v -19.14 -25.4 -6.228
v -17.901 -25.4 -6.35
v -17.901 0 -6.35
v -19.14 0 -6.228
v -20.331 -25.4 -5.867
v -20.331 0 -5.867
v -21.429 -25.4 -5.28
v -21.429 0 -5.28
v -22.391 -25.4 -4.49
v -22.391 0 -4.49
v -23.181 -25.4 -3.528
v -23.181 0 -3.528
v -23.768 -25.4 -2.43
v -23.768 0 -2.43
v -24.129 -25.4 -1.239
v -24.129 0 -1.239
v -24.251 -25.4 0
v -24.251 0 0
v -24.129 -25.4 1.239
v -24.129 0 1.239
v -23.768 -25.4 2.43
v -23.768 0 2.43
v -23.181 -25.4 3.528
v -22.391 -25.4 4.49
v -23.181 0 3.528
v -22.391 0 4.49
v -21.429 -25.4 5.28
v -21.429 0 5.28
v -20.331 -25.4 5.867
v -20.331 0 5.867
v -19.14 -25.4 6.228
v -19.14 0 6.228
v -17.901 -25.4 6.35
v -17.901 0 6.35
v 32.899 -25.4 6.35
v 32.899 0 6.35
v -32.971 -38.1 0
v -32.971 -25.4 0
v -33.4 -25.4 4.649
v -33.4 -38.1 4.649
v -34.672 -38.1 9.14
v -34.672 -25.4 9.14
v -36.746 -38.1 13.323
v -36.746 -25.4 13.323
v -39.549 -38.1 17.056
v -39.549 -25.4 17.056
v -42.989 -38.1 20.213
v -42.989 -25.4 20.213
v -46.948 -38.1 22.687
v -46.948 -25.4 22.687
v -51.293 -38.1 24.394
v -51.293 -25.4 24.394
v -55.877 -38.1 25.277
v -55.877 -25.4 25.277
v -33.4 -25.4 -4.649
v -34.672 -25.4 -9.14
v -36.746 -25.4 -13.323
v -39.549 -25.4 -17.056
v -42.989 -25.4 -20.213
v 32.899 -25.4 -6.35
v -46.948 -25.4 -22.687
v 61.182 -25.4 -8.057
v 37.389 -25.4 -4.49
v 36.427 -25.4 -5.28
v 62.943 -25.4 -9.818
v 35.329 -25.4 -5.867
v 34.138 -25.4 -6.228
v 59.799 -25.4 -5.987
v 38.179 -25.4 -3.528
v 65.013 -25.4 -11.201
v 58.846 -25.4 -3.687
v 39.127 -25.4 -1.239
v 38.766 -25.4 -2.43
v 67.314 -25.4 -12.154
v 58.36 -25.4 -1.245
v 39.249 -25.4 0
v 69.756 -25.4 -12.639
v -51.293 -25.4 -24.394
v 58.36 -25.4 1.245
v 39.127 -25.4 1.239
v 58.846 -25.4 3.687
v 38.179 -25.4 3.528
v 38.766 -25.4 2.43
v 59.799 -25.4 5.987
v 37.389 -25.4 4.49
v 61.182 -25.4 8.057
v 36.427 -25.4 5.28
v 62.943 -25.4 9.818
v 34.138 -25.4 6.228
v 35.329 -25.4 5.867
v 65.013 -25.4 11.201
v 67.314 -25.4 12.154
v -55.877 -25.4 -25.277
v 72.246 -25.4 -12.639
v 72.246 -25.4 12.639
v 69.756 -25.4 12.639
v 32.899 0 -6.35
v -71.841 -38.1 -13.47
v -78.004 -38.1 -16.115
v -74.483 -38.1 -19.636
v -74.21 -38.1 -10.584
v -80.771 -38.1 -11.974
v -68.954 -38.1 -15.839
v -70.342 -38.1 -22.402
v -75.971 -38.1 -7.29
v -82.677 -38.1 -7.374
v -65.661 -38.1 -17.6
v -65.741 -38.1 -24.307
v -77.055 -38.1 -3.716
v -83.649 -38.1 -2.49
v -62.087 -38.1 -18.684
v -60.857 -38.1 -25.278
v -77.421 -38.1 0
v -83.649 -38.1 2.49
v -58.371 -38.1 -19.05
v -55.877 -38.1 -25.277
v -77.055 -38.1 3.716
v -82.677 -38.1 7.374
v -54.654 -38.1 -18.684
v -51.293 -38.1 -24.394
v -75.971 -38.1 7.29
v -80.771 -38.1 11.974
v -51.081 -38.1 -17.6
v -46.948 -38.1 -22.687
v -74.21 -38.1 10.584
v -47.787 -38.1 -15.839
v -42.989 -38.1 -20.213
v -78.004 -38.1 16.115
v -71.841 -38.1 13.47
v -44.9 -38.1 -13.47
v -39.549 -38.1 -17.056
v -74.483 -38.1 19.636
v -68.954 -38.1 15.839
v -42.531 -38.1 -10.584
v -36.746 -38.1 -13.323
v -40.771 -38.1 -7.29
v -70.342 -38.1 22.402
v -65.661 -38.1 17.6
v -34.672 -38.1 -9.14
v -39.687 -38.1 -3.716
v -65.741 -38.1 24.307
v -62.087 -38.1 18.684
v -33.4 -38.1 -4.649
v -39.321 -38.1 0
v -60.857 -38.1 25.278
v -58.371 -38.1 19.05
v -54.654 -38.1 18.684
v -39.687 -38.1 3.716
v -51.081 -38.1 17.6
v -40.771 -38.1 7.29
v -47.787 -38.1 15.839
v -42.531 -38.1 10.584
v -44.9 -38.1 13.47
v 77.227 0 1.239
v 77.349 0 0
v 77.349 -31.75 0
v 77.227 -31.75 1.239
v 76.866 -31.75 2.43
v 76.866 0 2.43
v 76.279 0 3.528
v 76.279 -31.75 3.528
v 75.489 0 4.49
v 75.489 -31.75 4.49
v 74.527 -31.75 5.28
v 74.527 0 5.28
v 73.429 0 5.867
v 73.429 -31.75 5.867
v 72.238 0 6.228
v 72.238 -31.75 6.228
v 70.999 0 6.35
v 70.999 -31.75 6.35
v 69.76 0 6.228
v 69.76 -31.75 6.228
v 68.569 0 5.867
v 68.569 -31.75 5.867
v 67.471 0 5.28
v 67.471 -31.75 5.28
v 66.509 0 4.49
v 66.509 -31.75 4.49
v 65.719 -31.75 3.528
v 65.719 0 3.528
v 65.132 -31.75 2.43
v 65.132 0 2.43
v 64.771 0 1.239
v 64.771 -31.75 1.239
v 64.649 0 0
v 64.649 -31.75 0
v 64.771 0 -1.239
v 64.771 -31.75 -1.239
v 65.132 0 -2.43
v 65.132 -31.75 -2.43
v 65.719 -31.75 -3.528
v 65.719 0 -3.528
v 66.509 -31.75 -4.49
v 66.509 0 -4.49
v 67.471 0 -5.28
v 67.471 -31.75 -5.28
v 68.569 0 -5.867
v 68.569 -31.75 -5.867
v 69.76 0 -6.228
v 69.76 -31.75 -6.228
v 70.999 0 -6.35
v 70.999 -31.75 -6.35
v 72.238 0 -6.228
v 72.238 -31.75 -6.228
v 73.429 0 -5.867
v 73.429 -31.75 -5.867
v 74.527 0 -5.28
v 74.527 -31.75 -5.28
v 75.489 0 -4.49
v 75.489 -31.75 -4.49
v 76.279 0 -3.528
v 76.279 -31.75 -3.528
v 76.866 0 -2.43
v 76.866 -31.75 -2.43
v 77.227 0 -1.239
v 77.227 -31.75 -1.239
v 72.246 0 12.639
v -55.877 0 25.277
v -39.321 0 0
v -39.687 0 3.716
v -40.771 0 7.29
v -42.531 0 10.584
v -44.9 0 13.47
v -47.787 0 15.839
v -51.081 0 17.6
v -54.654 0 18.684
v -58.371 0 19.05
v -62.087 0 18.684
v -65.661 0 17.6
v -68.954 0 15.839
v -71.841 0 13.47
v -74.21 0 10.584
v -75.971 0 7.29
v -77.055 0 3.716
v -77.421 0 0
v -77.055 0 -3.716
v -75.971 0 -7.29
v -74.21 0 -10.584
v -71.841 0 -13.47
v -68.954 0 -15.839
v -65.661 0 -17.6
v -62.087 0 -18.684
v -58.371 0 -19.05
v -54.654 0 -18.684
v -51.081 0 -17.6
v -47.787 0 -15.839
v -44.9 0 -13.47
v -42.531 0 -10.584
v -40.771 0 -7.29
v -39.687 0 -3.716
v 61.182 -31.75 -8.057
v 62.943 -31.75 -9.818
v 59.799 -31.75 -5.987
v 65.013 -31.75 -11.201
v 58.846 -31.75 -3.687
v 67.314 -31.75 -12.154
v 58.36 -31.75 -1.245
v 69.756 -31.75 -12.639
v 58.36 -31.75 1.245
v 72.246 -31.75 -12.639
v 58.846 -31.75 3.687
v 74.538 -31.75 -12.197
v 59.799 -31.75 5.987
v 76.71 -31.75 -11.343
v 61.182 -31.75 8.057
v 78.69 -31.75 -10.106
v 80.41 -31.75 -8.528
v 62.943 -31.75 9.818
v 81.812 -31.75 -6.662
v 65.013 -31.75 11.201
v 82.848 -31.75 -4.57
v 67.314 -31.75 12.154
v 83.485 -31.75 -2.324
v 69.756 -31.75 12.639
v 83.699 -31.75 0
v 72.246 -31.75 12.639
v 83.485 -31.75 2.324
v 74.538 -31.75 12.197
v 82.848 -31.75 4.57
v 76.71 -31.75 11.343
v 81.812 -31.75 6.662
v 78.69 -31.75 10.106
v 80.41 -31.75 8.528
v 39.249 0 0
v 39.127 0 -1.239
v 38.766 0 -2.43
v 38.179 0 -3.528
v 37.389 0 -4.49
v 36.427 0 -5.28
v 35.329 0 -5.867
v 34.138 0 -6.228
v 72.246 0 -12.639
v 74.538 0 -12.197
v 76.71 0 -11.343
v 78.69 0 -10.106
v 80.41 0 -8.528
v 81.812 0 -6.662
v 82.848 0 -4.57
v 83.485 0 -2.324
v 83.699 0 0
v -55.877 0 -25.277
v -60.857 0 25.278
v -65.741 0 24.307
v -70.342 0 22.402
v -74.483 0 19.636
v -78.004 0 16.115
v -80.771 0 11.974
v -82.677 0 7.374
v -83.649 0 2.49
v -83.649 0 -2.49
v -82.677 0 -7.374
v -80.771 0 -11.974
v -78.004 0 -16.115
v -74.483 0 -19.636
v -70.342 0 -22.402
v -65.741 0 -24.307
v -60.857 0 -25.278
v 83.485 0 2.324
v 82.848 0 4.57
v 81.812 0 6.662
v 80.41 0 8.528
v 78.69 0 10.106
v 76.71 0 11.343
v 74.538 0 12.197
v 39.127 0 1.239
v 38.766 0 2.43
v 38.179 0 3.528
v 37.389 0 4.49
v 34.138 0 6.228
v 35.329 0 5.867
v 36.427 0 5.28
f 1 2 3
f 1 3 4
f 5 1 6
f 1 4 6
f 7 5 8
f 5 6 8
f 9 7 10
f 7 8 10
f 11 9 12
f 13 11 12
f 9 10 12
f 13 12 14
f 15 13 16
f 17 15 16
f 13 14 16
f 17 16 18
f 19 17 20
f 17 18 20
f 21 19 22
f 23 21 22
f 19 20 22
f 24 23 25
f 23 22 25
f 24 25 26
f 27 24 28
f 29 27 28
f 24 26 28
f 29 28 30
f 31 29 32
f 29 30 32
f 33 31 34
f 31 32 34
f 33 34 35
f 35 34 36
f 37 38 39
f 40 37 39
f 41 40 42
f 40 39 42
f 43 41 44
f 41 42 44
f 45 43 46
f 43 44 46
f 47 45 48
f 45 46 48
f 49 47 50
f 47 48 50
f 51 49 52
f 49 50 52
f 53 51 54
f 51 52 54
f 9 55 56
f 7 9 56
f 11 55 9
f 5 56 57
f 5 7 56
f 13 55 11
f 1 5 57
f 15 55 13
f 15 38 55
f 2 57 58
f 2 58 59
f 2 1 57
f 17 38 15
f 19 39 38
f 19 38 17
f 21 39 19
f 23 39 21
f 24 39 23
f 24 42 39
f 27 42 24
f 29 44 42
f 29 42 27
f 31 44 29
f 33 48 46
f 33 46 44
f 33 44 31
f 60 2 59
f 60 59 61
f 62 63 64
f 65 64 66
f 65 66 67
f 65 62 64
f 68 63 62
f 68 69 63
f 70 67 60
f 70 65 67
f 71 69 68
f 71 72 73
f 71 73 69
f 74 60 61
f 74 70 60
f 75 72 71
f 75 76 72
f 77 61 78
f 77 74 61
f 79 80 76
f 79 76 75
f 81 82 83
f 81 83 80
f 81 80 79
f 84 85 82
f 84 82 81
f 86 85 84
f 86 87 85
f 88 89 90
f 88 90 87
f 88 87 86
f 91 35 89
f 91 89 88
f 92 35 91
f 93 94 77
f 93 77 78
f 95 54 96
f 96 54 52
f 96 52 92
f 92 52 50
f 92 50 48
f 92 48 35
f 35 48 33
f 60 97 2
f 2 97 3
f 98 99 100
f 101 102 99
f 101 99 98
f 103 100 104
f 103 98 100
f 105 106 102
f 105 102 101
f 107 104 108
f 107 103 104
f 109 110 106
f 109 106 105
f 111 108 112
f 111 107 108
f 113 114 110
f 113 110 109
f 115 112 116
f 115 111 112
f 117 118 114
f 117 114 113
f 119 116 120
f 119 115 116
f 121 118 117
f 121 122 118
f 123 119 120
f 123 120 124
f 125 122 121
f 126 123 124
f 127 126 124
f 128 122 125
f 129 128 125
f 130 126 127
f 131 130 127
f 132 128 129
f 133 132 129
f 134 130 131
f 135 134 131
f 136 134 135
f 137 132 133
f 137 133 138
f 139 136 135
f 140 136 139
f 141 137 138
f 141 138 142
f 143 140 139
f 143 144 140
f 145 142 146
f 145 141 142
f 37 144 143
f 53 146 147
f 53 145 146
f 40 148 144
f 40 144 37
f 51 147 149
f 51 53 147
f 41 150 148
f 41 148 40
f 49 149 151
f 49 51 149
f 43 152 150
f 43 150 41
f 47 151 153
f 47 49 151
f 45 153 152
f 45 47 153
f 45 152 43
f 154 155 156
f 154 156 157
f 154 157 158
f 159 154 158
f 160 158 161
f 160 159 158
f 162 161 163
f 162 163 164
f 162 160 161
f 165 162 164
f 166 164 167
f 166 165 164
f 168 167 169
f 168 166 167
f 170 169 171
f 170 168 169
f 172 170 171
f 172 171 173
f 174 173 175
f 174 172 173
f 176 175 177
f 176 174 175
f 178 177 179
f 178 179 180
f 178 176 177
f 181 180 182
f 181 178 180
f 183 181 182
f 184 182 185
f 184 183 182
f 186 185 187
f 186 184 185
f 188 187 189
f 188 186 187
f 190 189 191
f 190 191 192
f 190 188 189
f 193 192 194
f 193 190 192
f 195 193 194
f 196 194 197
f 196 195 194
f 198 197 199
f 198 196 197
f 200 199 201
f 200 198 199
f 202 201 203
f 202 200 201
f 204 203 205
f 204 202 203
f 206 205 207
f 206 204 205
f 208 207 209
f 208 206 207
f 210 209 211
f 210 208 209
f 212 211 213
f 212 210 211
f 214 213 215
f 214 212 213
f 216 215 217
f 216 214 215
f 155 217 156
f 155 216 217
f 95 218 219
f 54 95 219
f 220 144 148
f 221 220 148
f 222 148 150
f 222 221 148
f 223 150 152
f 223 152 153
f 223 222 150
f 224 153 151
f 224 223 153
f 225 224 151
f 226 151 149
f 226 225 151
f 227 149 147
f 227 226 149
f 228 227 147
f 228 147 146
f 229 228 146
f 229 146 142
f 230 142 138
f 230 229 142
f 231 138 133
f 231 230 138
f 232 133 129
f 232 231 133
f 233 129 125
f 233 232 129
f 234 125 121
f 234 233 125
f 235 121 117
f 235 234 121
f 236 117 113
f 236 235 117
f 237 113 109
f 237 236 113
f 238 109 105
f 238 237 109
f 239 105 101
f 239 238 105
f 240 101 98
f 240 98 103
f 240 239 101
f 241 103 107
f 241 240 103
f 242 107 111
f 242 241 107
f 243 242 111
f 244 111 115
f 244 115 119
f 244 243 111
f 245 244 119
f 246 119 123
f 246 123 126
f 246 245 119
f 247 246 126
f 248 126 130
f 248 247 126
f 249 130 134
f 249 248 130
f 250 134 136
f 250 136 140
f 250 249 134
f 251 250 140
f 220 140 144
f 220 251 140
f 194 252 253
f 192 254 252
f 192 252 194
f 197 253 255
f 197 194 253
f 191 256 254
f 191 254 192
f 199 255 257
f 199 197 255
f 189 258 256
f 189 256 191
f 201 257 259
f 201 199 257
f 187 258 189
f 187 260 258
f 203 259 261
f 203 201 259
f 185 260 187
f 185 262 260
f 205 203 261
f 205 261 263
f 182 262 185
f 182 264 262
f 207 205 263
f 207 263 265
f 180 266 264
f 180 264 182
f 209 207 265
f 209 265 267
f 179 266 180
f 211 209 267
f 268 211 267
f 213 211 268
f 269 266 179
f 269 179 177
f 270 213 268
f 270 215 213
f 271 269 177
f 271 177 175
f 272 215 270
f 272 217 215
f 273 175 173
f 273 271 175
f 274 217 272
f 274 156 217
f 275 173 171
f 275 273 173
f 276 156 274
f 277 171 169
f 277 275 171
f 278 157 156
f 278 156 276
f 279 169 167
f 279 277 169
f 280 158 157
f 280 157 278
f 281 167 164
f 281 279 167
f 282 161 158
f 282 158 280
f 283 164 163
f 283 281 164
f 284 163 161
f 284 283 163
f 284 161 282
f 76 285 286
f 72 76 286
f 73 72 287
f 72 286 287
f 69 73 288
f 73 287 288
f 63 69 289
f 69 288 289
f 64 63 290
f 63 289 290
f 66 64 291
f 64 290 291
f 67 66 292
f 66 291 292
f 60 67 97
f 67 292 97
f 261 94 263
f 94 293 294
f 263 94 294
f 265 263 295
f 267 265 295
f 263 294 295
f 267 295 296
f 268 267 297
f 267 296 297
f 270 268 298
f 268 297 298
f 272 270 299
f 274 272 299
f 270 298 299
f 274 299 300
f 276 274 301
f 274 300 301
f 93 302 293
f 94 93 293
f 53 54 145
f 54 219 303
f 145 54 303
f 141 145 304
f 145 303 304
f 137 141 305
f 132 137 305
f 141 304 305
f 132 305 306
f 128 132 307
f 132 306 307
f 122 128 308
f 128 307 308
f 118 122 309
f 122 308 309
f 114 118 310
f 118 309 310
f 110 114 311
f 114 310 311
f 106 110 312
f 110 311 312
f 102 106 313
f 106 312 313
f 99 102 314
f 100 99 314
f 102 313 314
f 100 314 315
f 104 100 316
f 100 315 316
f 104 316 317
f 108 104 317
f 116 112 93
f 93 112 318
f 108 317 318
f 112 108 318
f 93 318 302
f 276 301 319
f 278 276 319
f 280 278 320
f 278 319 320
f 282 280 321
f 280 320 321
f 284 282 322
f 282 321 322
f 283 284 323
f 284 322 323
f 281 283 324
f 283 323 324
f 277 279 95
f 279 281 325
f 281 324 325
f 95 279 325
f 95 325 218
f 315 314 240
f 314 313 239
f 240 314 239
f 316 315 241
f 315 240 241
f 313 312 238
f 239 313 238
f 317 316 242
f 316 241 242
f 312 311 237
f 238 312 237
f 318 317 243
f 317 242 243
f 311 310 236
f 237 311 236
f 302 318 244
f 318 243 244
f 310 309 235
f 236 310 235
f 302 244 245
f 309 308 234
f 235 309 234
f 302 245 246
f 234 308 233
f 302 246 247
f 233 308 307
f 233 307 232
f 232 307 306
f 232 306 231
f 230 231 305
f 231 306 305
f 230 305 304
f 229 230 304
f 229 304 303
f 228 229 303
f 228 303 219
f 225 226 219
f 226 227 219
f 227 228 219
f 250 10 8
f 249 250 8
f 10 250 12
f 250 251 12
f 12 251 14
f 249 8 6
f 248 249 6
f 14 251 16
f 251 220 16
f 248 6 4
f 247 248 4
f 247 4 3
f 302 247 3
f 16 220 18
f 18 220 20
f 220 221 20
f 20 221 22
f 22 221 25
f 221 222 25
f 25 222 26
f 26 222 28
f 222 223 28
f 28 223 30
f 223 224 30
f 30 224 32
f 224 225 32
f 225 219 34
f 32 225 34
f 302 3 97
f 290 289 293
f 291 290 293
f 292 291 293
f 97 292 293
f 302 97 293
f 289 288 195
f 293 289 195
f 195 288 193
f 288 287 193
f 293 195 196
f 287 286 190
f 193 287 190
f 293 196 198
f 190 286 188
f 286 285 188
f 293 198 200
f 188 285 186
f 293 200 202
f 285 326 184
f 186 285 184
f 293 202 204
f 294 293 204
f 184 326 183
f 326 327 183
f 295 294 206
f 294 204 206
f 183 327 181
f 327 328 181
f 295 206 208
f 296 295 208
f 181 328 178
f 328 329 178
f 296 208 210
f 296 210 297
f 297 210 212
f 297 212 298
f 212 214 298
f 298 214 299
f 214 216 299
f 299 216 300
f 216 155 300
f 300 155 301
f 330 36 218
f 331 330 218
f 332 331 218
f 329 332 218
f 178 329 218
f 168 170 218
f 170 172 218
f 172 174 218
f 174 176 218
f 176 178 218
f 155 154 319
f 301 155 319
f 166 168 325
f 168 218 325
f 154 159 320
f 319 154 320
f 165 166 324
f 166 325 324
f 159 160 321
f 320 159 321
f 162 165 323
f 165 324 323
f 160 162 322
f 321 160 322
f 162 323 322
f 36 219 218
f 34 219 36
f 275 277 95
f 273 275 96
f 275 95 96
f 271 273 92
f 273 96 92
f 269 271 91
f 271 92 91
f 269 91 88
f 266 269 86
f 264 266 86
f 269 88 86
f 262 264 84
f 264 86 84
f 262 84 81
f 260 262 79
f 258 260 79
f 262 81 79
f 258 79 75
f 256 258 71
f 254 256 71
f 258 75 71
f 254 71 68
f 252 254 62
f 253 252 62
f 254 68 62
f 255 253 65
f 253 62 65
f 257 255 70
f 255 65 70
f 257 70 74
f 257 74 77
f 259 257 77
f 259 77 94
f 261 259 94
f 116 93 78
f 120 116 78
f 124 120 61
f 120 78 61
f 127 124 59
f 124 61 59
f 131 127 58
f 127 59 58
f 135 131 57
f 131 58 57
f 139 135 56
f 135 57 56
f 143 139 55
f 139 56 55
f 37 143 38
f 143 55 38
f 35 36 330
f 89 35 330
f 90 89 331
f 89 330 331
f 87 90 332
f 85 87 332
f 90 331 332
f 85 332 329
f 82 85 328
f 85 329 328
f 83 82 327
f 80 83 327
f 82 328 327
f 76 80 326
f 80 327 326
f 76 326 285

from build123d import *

# Parameters (mm, degrees)
F0_R     = 19.05
F1_DEPTH = 38.1
F2_DEPTH = 25.4
F0_R_2   = 6.35
F3_DEPTH = 31.75


with BuildPart() as f1:
    # F0 (on Front) → F1 (new body)
    with BuildSketch(Plane.XZ):
        with BuildLine():
            ThreePointArc((-55.877387, -25.277314), (-39.549404, -17.05617), (-32.970856, 0))
            ThreePointArc((-32.970856, 0), (-39.549404, 17.05617), (-55.877387, 25.277314))
            ThreePointArc((-55.877387, 25.277314), (-83.770856, 0), (-55.877387, -25.277314))
        make_face()
        with Locations((-58.370856, 0)):
            Circle(F0_R, mode=Mode.SUBTRACT)
    extrude(amount=F1_DEPTH)

    # F0 (on Front) → F2 (join)
    with BuildSketch(Plane.XZ):
        with BuildLine():
            ThreePointArc((-55.877387, 25.277314), (-39.549404, 17.05617), (-32.970856, 0))
            ThreePointArc((-32.970856, 0), (-39.549404, -17.05617), (-55.877387, -25.277314))
            Line((-55.877387, -25.277314), (72.245812, -12.638657))
            ThreePointArc((72.245812, -12.638657), (58.299077, 0), (72.245812, 12.638657))
            Line((72.245812, 12.638657), (-55.877387, 25.277314))
        make_face()
        with BuildLine():
            ThreePointArc((-17.900923, -6.35), (-24.250923, 0), (-17.900923, 6.35))
            Line((-17.900923, 6.35), (32.899077, 6.35))
            ThreePointArc((32.899077, 6.35), (37.389205, 4.490128), (39.249077, 0))
            ThreePointArc((39.249077, 0), (37.389205, -4.490128), (32.899077, -6.35))
            Line((32.899077, -6.35), (-17.900923, -6.35))
        make_face(mode=Mode.SUBTRACT)
    extrude(amount=F2_DEPTH)

    # F0 (on Front) → F3 (join)
    with BuildSketch(Plane.XZ):
        with BuildLine():
            ThreePointArc((83.699077, 0), (80.409803, 8.528085), (72.245812, 12.638657))
            ThreePointArc((72.245812, 12.638657), (58.299077, 0), (72.245812, -12.638657))
            ThreePointArc((72.245812, -12.638657), (80.409803, -8.528085), (83.699077, 0))
        make_face()
        with Locations((70.999077, 0)):
            Circle(F0_R_2, mode=Mode.SUBTRACT)
    extrude(amount=F3_DEPTH)


solid = f1.part
